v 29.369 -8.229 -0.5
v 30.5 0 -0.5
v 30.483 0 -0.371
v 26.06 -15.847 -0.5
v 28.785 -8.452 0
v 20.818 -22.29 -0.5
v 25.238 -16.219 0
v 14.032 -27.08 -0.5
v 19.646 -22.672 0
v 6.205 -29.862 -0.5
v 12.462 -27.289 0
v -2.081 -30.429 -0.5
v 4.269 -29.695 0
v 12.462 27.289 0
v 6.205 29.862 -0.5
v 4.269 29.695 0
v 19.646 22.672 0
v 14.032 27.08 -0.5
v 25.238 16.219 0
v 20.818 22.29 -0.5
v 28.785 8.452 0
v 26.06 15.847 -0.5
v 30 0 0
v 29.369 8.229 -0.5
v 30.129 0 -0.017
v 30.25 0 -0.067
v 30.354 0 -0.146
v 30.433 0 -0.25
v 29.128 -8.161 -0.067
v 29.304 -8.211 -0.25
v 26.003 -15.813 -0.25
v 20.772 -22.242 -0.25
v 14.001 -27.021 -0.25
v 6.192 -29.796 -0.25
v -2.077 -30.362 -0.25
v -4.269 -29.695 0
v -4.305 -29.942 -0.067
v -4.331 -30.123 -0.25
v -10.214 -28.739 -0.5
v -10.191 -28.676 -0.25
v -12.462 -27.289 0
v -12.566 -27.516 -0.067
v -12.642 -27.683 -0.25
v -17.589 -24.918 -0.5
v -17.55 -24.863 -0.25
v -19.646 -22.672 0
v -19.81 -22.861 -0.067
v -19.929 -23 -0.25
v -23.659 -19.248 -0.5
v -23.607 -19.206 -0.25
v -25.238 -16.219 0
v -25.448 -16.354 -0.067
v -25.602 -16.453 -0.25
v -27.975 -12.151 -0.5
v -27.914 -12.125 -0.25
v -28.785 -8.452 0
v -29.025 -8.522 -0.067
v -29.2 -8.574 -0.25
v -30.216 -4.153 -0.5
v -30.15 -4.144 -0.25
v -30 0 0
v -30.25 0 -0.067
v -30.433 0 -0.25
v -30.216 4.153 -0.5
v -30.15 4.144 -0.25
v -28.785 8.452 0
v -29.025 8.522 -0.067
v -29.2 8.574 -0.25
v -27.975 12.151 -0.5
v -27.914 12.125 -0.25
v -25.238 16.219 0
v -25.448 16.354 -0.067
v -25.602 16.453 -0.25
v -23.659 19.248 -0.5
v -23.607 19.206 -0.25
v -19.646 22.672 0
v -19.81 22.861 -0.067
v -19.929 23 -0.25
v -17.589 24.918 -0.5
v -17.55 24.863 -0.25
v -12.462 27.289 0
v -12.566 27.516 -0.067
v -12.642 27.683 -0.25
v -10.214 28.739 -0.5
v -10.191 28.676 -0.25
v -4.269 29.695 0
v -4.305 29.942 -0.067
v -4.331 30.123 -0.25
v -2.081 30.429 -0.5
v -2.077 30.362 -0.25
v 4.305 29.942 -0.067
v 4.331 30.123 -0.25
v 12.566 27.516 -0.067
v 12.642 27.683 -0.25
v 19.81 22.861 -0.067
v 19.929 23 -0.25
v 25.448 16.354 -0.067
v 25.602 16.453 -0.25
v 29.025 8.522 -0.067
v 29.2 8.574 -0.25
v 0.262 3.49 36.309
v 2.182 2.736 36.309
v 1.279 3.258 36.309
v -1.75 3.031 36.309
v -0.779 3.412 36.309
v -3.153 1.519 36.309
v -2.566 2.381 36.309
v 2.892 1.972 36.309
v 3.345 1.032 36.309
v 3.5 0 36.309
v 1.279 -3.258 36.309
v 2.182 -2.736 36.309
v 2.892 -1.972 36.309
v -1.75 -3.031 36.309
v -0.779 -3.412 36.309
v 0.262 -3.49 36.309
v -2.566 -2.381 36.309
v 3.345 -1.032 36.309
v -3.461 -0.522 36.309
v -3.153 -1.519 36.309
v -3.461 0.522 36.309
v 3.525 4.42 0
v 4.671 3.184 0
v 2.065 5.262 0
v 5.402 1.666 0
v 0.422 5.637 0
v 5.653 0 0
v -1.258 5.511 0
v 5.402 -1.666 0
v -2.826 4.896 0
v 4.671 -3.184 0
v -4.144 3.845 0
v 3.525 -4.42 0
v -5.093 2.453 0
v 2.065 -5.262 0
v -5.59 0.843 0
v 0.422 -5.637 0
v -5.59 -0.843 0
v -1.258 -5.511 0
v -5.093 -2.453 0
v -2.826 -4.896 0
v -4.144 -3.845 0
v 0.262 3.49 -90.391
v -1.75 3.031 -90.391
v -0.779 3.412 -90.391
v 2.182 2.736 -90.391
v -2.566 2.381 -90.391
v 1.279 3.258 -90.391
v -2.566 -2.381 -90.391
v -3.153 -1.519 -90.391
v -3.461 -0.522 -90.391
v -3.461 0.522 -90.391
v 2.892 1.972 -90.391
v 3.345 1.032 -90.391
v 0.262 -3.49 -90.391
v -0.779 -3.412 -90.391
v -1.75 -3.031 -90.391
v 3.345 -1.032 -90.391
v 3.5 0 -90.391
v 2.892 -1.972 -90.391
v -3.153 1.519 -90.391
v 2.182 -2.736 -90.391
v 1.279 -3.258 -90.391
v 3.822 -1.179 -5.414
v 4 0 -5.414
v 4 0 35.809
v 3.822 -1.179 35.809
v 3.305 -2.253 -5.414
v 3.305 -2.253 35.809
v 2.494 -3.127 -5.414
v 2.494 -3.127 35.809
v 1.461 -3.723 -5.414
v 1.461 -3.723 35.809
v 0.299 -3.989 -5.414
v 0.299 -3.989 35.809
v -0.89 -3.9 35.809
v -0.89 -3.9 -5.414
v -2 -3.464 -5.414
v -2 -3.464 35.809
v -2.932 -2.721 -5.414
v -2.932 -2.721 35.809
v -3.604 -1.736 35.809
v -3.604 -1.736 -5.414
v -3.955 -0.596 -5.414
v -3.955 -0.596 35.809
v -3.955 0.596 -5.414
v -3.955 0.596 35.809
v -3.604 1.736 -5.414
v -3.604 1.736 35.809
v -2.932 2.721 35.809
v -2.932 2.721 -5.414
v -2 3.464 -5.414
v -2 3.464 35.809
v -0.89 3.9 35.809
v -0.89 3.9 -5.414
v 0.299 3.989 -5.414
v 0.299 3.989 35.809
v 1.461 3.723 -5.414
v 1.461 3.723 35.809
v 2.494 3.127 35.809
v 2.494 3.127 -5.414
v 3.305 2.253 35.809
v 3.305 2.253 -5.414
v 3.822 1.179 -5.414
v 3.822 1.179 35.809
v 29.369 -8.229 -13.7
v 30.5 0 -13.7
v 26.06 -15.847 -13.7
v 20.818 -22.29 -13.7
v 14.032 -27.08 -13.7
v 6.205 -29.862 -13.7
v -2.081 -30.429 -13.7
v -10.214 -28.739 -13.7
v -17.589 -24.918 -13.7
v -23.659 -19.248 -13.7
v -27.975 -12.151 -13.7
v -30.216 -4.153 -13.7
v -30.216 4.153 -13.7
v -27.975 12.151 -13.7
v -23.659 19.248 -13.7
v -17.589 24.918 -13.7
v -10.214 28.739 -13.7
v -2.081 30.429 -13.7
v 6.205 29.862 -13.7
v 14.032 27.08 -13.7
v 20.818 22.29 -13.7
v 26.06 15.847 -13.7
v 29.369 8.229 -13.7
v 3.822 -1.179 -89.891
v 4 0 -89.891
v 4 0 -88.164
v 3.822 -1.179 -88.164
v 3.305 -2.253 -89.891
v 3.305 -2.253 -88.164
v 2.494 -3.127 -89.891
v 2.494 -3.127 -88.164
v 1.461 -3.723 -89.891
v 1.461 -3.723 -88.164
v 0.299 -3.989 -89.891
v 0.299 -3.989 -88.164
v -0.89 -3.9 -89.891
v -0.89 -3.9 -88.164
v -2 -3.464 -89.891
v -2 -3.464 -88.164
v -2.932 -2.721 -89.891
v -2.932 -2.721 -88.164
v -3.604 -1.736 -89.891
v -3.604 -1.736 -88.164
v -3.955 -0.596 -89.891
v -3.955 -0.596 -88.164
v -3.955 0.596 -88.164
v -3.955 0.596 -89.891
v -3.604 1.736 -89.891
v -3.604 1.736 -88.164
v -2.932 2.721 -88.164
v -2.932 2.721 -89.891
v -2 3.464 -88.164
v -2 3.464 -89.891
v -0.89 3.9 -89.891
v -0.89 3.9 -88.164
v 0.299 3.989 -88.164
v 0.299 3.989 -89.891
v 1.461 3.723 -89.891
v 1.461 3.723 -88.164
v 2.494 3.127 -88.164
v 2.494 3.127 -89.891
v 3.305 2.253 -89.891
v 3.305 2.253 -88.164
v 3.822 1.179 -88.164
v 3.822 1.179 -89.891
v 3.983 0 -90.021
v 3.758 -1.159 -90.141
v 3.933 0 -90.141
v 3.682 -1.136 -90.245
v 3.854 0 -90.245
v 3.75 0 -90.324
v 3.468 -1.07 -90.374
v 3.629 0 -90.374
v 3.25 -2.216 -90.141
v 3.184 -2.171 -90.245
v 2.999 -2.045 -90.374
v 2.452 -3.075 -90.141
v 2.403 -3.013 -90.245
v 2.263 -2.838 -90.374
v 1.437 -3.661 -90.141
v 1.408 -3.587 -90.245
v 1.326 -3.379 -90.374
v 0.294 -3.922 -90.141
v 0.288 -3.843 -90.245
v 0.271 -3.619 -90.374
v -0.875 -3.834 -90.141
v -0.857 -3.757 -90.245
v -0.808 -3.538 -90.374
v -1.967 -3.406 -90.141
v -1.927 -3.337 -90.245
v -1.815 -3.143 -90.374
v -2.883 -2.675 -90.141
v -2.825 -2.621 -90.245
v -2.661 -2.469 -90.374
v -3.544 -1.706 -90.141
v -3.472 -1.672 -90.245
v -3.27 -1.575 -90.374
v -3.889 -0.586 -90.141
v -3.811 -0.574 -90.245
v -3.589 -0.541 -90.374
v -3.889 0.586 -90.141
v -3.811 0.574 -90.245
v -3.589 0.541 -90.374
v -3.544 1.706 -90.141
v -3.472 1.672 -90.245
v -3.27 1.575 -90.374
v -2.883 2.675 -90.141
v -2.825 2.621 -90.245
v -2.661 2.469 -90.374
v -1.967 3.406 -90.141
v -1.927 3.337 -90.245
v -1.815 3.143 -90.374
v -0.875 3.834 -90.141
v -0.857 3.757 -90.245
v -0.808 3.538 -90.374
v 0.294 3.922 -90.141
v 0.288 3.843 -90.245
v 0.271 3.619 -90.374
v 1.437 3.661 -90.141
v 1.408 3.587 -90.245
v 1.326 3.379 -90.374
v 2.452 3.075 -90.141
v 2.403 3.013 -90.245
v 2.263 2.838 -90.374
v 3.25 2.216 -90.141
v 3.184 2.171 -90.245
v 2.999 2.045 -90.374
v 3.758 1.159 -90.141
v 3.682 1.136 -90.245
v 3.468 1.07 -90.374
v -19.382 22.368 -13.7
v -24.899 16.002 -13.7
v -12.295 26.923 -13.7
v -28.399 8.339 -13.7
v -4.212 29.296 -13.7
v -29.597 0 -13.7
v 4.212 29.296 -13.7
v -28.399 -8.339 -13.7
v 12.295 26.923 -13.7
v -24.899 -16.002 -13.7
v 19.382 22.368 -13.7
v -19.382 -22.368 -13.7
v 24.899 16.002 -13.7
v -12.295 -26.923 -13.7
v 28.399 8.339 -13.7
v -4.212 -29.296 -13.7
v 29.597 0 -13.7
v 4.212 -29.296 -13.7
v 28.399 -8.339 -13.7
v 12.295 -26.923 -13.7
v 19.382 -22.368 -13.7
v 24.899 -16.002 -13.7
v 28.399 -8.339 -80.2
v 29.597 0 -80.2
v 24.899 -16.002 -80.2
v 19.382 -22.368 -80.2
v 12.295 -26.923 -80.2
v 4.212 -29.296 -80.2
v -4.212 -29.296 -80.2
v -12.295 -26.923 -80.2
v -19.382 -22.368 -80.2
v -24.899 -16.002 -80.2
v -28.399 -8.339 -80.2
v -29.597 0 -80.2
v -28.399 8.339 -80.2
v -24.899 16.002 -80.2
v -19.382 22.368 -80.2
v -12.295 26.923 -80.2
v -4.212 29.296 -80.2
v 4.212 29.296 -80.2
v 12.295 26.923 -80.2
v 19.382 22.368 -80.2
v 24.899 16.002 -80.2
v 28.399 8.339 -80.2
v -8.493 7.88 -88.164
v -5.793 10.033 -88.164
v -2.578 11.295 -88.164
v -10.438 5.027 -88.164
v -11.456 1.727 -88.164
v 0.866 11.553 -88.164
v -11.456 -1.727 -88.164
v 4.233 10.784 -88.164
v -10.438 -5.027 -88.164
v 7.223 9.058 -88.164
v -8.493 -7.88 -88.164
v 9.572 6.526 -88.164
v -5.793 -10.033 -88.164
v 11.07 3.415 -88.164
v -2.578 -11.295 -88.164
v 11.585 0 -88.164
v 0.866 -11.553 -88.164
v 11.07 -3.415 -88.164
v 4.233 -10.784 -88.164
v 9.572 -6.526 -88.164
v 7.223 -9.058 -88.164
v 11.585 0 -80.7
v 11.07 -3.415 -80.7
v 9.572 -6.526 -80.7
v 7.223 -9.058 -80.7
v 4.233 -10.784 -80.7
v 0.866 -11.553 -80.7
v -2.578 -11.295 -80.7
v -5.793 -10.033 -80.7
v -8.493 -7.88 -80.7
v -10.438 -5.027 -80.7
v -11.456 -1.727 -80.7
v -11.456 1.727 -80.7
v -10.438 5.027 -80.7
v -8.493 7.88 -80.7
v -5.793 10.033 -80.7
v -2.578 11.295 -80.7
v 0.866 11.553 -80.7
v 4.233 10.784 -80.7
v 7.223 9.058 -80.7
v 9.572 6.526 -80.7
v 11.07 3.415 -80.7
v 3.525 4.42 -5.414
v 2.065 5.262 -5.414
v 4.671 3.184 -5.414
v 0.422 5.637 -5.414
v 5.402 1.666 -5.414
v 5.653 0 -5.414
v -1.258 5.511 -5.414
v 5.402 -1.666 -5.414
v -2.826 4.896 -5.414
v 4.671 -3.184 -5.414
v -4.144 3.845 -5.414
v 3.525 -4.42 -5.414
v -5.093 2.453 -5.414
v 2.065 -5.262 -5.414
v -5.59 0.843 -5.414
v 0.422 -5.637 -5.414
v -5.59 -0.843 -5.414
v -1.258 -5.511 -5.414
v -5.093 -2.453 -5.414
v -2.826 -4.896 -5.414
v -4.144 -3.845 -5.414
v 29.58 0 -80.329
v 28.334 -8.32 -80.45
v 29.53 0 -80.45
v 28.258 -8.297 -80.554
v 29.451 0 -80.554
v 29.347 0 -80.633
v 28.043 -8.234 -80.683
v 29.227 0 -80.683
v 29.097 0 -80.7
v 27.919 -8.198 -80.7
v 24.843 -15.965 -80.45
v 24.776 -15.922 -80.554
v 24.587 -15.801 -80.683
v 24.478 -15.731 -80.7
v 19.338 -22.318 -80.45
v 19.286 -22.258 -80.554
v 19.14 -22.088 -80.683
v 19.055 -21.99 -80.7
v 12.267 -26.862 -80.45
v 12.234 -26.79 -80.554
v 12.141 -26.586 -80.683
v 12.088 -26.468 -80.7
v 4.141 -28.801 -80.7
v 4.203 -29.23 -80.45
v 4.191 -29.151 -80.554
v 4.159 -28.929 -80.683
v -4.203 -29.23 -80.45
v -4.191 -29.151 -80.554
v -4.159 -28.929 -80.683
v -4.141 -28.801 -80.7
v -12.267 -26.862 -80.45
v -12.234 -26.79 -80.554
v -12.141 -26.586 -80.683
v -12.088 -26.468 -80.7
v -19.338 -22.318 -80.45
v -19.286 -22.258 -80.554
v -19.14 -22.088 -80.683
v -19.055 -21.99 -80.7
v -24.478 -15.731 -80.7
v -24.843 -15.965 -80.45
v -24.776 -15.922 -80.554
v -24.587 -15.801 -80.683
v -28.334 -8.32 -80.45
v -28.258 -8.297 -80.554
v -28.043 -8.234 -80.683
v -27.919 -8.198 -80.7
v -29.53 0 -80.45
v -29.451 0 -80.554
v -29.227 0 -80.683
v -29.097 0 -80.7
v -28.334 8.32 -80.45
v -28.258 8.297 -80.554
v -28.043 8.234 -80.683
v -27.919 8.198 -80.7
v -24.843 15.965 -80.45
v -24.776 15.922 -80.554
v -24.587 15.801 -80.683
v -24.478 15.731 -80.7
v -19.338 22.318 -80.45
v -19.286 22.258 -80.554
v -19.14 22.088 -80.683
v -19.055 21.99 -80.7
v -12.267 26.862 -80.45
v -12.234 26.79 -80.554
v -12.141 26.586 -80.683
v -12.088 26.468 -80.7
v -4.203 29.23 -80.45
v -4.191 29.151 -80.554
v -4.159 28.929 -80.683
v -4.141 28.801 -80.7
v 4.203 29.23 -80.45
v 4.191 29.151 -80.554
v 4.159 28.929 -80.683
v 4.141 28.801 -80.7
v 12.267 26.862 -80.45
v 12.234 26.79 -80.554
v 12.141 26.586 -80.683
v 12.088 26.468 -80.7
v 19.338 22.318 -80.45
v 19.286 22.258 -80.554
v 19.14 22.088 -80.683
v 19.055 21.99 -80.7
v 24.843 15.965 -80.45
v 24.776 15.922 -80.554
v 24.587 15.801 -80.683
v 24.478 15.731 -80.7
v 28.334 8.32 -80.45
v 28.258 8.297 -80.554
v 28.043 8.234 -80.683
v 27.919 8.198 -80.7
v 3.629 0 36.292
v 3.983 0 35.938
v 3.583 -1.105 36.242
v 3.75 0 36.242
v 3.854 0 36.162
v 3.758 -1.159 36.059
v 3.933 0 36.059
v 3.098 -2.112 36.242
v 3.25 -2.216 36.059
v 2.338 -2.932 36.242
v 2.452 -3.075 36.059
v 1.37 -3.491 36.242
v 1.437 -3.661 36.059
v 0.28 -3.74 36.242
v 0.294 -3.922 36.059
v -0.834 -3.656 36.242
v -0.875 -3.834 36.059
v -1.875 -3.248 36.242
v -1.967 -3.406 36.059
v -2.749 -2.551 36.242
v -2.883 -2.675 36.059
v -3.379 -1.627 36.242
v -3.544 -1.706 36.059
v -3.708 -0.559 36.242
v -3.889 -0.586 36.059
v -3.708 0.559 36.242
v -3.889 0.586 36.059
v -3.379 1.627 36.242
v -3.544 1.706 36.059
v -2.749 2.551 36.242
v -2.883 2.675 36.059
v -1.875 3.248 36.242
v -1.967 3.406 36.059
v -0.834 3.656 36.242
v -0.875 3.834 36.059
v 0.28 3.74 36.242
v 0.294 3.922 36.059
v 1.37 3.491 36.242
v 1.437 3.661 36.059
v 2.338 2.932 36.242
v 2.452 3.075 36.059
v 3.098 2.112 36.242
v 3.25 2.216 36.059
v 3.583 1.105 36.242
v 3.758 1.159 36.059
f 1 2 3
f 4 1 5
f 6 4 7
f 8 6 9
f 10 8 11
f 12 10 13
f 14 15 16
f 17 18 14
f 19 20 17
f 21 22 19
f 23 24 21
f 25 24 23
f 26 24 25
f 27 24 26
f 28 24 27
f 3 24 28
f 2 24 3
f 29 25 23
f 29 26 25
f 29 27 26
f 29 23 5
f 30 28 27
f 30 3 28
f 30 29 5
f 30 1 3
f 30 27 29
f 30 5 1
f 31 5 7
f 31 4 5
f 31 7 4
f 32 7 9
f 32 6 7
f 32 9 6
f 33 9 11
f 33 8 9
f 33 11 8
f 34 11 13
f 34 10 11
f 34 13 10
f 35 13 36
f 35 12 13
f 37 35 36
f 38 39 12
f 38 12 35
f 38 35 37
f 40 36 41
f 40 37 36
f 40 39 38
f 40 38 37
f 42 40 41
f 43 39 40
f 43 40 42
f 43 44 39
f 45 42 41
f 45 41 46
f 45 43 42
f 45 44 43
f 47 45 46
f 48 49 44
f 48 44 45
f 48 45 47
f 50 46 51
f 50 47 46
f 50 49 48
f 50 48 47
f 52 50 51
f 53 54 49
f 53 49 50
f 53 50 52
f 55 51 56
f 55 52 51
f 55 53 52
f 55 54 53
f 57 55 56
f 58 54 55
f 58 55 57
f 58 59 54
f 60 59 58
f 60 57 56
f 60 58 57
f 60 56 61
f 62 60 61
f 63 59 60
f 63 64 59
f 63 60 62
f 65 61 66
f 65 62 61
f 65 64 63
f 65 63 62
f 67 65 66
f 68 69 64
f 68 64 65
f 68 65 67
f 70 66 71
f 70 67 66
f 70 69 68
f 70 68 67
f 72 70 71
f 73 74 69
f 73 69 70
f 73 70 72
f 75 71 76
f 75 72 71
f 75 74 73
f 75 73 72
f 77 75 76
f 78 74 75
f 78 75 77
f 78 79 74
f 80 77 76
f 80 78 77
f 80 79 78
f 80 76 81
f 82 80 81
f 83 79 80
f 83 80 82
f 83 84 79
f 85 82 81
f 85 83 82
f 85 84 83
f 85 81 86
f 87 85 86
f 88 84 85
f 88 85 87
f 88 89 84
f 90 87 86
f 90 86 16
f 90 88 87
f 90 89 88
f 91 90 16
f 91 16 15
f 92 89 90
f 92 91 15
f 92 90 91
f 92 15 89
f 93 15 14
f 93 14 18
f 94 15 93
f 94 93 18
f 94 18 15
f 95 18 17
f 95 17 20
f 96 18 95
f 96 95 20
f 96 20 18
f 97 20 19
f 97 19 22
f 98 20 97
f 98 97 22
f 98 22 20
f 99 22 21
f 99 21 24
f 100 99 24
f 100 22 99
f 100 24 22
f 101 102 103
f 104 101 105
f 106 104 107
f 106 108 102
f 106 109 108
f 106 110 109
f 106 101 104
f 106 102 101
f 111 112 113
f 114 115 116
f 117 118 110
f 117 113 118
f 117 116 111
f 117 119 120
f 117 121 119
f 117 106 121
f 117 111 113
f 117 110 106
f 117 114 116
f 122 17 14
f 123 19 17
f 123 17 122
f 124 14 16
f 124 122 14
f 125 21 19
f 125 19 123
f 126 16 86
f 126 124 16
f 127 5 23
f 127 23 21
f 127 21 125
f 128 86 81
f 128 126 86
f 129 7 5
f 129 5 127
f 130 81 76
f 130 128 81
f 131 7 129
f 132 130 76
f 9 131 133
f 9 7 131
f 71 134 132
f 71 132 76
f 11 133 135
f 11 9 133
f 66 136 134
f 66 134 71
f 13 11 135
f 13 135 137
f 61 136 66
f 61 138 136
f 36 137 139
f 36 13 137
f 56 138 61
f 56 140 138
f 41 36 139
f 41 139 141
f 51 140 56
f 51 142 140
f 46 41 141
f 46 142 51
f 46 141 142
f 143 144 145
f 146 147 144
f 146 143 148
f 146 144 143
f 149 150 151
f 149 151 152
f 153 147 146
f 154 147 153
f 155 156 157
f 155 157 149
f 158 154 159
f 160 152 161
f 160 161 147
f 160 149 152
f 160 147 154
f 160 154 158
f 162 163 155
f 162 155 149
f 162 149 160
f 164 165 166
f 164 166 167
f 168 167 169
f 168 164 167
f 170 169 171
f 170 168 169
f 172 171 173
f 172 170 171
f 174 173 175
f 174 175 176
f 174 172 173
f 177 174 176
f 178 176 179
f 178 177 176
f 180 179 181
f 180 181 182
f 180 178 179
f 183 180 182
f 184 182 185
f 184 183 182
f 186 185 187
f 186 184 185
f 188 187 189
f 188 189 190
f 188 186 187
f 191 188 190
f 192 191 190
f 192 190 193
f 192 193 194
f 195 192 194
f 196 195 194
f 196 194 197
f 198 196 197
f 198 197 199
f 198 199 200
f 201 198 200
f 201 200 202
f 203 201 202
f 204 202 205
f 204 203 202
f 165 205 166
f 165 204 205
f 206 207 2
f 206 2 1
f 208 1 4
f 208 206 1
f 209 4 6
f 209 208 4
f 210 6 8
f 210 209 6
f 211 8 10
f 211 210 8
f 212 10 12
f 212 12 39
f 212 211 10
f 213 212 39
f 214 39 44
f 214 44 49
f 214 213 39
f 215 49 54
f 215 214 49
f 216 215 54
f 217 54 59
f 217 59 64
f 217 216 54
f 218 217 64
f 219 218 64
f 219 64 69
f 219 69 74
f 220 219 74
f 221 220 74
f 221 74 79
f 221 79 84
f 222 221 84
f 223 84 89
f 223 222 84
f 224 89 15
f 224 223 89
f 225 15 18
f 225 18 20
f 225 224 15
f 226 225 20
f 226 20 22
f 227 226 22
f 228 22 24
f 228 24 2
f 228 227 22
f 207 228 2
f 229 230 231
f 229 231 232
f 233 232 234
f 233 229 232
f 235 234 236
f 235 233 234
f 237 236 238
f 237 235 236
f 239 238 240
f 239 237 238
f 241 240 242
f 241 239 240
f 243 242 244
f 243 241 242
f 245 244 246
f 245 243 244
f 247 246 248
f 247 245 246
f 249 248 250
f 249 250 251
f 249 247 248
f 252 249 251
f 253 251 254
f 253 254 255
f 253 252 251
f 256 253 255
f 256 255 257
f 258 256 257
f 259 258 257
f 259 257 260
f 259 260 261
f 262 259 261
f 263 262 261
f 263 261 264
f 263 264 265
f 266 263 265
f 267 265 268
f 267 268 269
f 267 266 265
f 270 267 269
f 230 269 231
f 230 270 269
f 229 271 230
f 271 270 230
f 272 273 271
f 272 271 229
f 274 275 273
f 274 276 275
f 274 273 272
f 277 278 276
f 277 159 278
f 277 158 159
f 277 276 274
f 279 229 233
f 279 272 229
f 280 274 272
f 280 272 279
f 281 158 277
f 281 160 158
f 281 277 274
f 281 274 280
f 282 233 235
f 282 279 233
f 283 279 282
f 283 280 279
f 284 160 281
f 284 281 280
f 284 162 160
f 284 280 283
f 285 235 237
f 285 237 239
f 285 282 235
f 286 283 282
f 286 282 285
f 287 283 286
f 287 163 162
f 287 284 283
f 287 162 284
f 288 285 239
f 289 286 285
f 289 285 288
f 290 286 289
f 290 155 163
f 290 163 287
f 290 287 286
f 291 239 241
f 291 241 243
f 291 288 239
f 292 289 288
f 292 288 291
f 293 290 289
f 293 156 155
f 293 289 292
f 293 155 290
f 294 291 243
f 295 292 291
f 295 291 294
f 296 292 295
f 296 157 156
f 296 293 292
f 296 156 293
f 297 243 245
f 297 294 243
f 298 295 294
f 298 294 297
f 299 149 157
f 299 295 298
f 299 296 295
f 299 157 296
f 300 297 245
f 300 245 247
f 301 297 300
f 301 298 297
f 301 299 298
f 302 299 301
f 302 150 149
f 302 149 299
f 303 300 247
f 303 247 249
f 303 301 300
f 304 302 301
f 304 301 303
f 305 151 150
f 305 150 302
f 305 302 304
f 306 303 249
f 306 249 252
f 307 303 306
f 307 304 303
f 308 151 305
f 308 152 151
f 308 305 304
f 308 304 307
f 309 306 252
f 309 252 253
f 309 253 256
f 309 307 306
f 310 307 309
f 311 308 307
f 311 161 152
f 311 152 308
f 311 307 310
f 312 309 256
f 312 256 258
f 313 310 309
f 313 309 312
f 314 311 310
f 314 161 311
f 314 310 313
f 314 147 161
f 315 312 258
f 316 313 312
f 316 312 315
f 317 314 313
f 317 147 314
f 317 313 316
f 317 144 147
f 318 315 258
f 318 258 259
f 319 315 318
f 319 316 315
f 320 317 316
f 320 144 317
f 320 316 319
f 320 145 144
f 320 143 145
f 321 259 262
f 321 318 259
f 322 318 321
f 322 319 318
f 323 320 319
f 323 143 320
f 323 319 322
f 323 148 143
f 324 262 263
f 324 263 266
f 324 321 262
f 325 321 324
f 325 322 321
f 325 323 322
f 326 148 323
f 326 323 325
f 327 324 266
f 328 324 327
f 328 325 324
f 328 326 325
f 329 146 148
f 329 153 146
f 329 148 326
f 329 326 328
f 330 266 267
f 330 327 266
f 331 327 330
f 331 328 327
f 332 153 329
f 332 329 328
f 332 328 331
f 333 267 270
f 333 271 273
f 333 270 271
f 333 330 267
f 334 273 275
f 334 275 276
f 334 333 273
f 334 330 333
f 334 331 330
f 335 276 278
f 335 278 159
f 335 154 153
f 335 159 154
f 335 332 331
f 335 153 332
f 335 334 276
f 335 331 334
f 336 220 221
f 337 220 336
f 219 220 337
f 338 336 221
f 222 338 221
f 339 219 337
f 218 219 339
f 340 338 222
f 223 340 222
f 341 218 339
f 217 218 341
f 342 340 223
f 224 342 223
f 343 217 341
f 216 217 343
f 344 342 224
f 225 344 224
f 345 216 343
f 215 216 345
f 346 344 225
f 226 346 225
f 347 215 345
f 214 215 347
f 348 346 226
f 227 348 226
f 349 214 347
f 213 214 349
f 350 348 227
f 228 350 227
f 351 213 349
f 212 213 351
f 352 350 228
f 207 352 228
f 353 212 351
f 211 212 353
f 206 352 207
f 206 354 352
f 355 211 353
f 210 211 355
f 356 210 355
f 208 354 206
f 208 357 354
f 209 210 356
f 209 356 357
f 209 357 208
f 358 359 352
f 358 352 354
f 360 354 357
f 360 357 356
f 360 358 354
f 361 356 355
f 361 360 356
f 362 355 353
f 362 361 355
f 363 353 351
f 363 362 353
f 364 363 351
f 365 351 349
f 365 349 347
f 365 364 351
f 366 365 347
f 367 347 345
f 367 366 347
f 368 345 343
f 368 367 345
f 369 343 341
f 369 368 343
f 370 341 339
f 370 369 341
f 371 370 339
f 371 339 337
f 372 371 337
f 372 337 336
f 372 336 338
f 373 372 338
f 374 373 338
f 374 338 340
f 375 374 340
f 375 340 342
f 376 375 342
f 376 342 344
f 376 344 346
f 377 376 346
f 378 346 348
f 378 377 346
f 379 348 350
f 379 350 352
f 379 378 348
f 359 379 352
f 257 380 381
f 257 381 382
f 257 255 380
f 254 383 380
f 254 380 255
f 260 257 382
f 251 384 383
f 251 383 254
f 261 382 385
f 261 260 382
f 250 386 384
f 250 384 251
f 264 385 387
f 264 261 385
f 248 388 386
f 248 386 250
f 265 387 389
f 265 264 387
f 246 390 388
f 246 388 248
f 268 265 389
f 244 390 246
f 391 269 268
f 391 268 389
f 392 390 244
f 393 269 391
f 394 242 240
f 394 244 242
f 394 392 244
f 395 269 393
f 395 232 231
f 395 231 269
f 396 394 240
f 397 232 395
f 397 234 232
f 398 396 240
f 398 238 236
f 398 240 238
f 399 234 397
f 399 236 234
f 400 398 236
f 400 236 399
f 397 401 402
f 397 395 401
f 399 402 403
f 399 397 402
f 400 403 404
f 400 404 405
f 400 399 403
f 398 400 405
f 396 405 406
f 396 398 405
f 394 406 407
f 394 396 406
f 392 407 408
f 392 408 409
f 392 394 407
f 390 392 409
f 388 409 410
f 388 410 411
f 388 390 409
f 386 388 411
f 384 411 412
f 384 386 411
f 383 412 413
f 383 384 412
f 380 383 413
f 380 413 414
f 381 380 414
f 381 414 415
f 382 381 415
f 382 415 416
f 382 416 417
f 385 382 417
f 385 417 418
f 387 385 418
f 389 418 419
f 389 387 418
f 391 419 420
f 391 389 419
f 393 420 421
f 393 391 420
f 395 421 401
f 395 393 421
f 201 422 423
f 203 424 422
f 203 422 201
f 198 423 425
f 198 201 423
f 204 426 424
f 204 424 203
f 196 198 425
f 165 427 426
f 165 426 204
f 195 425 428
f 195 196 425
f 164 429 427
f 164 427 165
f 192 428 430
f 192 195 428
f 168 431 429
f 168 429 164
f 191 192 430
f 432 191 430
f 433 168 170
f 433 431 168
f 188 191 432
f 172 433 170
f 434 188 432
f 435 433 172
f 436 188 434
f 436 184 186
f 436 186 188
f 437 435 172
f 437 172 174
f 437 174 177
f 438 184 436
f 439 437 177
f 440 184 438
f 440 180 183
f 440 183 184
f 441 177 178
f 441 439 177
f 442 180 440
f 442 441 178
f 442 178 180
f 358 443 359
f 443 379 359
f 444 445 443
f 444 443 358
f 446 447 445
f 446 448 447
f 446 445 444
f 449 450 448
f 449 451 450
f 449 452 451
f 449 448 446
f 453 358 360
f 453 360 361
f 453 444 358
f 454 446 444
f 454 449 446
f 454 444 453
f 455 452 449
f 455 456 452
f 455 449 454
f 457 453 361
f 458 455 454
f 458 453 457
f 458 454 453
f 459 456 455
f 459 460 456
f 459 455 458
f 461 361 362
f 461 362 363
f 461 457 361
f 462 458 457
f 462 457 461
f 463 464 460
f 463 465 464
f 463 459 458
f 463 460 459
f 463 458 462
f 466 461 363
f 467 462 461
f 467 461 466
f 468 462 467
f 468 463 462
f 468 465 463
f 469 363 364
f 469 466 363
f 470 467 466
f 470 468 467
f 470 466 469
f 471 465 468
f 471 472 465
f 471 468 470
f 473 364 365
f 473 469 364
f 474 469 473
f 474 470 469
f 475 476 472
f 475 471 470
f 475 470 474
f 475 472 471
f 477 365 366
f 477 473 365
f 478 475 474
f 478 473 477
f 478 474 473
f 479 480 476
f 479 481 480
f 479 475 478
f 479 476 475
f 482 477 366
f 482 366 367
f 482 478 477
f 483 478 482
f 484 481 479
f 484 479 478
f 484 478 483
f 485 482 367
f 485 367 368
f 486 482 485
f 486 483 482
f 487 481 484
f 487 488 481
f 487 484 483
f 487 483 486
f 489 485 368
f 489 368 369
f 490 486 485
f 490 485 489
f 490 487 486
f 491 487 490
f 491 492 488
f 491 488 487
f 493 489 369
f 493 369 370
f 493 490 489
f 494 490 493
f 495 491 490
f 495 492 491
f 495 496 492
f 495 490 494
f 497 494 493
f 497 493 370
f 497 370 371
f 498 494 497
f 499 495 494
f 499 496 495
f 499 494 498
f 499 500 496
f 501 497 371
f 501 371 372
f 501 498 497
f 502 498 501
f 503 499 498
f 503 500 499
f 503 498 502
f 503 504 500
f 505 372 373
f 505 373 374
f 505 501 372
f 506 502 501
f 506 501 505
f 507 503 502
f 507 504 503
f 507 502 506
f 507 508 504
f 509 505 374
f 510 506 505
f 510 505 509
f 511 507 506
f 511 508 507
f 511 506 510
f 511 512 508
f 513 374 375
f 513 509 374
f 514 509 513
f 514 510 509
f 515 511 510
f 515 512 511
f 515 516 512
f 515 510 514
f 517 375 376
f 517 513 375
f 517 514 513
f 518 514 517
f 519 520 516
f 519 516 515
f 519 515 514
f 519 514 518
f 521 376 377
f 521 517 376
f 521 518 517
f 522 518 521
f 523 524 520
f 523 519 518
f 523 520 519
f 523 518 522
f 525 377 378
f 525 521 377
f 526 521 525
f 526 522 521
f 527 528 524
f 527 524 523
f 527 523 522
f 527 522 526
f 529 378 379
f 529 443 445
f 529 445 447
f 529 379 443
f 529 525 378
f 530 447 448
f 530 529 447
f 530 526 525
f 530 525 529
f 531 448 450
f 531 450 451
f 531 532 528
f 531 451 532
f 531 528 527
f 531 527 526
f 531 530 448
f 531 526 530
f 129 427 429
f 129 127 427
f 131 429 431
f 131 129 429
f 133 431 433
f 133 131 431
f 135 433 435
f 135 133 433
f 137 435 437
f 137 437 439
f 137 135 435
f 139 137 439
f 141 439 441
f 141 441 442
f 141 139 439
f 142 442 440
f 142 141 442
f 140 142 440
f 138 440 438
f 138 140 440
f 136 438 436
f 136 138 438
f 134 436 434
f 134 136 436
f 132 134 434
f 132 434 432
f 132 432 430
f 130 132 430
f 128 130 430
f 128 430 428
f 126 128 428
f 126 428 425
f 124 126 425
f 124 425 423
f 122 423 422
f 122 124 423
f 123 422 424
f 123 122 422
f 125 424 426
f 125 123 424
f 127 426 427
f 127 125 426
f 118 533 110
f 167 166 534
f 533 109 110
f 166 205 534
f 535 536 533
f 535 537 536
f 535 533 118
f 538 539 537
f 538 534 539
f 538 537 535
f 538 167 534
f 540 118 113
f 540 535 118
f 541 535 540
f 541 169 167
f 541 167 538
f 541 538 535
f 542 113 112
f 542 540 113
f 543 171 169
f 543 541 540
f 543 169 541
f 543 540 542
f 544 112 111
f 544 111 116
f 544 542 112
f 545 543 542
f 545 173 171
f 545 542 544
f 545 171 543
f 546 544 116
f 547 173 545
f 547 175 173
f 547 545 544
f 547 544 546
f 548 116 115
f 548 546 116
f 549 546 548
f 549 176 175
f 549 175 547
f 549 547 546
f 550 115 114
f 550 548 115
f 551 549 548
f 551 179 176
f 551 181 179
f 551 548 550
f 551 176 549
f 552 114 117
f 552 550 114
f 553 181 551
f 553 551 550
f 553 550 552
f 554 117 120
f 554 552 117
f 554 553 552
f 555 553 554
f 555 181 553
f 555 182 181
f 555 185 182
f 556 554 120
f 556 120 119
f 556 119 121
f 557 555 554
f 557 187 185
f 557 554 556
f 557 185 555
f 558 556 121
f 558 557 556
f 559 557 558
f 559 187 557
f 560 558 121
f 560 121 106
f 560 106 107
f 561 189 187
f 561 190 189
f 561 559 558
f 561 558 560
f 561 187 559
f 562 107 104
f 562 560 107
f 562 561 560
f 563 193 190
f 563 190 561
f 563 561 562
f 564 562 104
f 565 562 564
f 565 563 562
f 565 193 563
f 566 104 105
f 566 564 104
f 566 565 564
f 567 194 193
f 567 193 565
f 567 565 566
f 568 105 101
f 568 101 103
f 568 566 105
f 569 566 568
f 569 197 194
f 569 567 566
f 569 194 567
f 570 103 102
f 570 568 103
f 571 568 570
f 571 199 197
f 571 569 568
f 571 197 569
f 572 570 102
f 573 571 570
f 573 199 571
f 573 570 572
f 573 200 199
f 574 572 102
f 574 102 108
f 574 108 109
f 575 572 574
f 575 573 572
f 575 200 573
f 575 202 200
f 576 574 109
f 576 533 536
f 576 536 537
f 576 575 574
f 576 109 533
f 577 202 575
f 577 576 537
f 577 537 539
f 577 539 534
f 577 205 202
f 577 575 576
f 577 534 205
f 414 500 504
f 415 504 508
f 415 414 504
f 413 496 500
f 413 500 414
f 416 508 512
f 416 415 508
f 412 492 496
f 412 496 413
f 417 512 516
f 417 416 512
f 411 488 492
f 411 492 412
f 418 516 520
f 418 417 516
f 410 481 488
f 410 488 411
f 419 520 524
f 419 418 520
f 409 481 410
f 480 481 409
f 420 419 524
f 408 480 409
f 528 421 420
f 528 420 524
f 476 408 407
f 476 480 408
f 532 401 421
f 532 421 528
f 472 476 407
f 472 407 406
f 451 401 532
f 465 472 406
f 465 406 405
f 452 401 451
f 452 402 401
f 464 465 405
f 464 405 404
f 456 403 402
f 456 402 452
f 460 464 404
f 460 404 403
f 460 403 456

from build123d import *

# Parameters (mm, degrees)
FILLET2_R = 0.5


with BuildPart() as part:
    # Sketch1 → Revolve1 (revolve)
    with BuildSketch(Plane(origin=(0, 0, 0), x_dir=(0, 0, -1), z_dir=(1, 0, 0)), mode=Mode.PRIVATE) as revolve1_sk:
        Polygon((13.7, 30.5), (13.7, 29.597484089), (80.7, 29.597484089), (80.7, 11.585161601), (88.164497018, 11.585161601), (88.164497018, 4), (90.391404279, 4), (90.391404279, 0), (-36.308595721, 0), (-36.308595721, 4), (5.413824797, 4), (5.413824797, 5.652900668), (0, 5.652900668), (0, 30.5), align=None)
    revolve(revolve1_sk.sketch.rotate(Axis((0, 0, 36.308595721), (0, 0, -1)), 90), axis=Axis((0, 0, 36.308595721), (0, 0, -1)))

    # Fillet2
    fillet2_edges = [part.edges().sort_by_distance(p)[0] for p in [
        (-4, 0, 36.308595721),
        (-4, 0, -90.391404279),
        (-29.597484089, 0, -80.7),
        (-30.5, 0, 0),
    ]]
    fillet(fillet2_edges, radius=FILLET2_R)


solid = part.part
